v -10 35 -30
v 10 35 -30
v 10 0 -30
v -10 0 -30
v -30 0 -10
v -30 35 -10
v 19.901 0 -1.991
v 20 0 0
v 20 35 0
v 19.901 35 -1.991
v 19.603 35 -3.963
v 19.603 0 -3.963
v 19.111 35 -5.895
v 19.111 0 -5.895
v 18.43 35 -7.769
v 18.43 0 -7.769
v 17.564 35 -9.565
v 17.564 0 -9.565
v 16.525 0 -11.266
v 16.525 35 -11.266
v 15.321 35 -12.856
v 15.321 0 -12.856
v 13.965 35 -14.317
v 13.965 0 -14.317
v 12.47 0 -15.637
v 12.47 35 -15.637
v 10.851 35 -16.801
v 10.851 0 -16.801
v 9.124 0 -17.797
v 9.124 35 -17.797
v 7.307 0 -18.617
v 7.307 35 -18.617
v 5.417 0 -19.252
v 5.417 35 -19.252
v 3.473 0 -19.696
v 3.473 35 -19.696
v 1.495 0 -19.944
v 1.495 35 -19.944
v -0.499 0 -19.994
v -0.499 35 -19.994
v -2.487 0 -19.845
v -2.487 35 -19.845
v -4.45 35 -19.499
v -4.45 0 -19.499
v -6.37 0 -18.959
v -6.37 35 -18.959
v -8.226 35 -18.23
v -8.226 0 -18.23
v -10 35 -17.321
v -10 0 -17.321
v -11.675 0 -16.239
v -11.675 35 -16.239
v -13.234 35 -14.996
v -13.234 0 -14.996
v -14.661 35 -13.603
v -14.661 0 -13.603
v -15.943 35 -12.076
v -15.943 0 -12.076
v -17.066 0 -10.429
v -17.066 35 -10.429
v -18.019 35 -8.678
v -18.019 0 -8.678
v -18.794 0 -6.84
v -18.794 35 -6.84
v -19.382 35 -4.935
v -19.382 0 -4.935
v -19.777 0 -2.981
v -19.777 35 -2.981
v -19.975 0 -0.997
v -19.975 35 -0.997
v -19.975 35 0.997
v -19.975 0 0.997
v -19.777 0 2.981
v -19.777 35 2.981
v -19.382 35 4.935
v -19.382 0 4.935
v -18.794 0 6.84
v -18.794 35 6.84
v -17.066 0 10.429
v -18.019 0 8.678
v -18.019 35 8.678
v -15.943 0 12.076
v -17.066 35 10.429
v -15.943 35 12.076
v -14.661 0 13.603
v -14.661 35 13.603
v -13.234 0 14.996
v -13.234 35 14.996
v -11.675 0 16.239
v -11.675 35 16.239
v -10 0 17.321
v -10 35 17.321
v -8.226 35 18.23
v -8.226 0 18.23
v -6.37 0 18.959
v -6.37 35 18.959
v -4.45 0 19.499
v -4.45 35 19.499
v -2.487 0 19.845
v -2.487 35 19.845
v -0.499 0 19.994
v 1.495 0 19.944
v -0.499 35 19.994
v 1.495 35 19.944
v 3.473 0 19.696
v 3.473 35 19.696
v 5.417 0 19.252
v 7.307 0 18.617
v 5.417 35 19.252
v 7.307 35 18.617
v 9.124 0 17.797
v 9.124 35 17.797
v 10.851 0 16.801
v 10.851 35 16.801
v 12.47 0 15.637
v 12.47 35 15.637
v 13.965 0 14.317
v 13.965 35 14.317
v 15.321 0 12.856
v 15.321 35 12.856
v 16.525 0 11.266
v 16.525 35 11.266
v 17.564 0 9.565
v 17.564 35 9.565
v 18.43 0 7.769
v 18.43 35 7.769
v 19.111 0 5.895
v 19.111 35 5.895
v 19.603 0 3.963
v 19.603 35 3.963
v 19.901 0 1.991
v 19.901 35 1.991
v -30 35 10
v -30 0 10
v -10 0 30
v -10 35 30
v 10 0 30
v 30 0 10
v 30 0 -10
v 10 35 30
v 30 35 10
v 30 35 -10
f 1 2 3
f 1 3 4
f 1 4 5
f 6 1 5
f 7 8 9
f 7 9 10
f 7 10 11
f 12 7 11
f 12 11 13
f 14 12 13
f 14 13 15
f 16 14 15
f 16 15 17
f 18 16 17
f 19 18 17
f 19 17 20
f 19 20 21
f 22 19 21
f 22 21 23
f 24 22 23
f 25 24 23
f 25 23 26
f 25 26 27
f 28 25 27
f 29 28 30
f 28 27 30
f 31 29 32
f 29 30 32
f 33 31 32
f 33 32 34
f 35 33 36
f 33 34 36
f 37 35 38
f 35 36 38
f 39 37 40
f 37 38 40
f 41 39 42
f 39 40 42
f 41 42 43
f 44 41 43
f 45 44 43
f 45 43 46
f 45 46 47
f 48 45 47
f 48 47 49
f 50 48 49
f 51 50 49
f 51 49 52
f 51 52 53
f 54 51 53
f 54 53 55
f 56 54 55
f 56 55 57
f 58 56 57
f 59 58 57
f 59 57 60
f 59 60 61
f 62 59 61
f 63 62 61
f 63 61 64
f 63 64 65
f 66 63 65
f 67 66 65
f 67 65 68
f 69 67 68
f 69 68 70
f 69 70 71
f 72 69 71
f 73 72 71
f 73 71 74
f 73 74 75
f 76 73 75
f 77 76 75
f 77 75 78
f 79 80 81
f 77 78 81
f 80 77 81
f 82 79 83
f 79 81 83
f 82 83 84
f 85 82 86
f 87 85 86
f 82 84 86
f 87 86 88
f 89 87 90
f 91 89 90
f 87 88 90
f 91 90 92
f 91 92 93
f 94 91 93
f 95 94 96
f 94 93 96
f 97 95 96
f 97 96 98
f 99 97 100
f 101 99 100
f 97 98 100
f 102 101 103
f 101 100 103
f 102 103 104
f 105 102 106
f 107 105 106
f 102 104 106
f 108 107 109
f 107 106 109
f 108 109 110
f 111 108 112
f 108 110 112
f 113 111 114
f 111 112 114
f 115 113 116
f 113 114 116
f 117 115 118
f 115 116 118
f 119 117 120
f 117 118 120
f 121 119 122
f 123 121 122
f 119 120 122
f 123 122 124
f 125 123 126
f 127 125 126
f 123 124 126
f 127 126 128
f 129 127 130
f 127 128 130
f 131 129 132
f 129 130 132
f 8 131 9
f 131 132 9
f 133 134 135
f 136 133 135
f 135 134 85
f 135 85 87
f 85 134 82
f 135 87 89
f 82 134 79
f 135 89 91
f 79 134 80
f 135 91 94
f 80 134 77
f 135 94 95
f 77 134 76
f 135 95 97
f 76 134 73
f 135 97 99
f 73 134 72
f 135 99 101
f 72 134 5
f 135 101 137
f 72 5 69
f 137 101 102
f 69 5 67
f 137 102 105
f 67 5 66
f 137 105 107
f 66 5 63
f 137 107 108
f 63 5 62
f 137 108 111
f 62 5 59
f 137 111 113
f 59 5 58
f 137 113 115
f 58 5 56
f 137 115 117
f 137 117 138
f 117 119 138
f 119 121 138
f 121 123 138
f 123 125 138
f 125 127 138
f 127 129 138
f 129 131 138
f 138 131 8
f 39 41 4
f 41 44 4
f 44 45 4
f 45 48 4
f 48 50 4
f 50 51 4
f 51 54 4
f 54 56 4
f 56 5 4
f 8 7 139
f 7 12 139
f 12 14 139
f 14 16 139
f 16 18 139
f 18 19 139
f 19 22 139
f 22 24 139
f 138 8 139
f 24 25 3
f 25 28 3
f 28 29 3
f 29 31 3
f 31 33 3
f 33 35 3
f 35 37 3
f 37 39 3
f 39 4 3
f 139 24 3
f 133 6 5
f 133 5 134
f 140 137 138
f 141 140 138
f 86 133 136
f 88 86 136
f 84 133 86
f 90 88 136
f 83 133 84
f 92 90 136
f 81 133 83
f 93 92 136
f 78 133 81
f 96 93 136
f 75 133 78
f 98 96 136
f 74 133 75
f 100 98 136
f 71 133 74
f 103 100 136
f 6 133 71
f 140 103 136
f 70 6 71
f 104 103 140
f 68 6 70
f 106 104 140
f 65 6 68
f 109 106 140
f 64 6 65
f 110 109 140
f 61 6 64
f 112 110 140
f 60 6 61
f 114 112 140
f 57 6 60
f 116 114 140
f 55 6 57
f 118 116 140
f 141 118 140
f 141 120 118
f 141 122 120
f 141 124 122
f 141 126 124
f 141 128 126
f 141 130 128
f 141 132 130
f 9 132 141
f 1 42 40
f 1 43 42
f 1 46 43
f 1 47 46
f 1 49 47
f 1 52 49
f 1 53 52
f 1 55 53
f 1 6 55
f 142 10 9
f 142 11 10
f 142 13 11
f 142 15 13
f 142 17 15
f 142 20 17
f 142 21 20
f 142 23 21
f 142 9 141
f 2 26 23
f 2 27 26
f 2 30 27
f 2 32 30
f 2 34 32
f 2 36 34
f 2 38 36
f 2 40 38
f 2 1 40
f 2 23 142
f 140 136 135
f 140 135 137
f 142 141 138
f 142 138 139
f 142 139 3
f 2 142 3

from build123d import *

# Parameters (mm, degrees)
BOSS_EXTRUDE1_DEPTH = 35
SKETCH2_R           = 20
CUT_EXTRUDE1_DEPTH  = 36


with BuildPart() as part:
    # Sketch1 → Boss-Extrude1 (new body)
    with BuildSketch(Plane(origin=(0, 0, 0), x_dir=(1, 0, 0), z_dir=(0, 1, 0))):
        Polygon((30, 10), (10, 30), (-10, 30), (-30, 10), (-30, -10), (-10, -30), (10, -30), (30, -10), align=None)
    extrude(amount=BOSS_EXTRUDE1_DEPTH)

    # Sketch2 → Cut-Extrude1 (cut, through all)
    with BuildSketch(Plane(origin=(0, 35, 0), x_dir=(1, 0, 0), z_dir=(0, 1, 0))):
        Circle(SKETCH2_R)
    extrude(amount=-CUT_EXTRUDE1_DEPTH, mode=Mode.SUBTRACT)


solid = part.part
